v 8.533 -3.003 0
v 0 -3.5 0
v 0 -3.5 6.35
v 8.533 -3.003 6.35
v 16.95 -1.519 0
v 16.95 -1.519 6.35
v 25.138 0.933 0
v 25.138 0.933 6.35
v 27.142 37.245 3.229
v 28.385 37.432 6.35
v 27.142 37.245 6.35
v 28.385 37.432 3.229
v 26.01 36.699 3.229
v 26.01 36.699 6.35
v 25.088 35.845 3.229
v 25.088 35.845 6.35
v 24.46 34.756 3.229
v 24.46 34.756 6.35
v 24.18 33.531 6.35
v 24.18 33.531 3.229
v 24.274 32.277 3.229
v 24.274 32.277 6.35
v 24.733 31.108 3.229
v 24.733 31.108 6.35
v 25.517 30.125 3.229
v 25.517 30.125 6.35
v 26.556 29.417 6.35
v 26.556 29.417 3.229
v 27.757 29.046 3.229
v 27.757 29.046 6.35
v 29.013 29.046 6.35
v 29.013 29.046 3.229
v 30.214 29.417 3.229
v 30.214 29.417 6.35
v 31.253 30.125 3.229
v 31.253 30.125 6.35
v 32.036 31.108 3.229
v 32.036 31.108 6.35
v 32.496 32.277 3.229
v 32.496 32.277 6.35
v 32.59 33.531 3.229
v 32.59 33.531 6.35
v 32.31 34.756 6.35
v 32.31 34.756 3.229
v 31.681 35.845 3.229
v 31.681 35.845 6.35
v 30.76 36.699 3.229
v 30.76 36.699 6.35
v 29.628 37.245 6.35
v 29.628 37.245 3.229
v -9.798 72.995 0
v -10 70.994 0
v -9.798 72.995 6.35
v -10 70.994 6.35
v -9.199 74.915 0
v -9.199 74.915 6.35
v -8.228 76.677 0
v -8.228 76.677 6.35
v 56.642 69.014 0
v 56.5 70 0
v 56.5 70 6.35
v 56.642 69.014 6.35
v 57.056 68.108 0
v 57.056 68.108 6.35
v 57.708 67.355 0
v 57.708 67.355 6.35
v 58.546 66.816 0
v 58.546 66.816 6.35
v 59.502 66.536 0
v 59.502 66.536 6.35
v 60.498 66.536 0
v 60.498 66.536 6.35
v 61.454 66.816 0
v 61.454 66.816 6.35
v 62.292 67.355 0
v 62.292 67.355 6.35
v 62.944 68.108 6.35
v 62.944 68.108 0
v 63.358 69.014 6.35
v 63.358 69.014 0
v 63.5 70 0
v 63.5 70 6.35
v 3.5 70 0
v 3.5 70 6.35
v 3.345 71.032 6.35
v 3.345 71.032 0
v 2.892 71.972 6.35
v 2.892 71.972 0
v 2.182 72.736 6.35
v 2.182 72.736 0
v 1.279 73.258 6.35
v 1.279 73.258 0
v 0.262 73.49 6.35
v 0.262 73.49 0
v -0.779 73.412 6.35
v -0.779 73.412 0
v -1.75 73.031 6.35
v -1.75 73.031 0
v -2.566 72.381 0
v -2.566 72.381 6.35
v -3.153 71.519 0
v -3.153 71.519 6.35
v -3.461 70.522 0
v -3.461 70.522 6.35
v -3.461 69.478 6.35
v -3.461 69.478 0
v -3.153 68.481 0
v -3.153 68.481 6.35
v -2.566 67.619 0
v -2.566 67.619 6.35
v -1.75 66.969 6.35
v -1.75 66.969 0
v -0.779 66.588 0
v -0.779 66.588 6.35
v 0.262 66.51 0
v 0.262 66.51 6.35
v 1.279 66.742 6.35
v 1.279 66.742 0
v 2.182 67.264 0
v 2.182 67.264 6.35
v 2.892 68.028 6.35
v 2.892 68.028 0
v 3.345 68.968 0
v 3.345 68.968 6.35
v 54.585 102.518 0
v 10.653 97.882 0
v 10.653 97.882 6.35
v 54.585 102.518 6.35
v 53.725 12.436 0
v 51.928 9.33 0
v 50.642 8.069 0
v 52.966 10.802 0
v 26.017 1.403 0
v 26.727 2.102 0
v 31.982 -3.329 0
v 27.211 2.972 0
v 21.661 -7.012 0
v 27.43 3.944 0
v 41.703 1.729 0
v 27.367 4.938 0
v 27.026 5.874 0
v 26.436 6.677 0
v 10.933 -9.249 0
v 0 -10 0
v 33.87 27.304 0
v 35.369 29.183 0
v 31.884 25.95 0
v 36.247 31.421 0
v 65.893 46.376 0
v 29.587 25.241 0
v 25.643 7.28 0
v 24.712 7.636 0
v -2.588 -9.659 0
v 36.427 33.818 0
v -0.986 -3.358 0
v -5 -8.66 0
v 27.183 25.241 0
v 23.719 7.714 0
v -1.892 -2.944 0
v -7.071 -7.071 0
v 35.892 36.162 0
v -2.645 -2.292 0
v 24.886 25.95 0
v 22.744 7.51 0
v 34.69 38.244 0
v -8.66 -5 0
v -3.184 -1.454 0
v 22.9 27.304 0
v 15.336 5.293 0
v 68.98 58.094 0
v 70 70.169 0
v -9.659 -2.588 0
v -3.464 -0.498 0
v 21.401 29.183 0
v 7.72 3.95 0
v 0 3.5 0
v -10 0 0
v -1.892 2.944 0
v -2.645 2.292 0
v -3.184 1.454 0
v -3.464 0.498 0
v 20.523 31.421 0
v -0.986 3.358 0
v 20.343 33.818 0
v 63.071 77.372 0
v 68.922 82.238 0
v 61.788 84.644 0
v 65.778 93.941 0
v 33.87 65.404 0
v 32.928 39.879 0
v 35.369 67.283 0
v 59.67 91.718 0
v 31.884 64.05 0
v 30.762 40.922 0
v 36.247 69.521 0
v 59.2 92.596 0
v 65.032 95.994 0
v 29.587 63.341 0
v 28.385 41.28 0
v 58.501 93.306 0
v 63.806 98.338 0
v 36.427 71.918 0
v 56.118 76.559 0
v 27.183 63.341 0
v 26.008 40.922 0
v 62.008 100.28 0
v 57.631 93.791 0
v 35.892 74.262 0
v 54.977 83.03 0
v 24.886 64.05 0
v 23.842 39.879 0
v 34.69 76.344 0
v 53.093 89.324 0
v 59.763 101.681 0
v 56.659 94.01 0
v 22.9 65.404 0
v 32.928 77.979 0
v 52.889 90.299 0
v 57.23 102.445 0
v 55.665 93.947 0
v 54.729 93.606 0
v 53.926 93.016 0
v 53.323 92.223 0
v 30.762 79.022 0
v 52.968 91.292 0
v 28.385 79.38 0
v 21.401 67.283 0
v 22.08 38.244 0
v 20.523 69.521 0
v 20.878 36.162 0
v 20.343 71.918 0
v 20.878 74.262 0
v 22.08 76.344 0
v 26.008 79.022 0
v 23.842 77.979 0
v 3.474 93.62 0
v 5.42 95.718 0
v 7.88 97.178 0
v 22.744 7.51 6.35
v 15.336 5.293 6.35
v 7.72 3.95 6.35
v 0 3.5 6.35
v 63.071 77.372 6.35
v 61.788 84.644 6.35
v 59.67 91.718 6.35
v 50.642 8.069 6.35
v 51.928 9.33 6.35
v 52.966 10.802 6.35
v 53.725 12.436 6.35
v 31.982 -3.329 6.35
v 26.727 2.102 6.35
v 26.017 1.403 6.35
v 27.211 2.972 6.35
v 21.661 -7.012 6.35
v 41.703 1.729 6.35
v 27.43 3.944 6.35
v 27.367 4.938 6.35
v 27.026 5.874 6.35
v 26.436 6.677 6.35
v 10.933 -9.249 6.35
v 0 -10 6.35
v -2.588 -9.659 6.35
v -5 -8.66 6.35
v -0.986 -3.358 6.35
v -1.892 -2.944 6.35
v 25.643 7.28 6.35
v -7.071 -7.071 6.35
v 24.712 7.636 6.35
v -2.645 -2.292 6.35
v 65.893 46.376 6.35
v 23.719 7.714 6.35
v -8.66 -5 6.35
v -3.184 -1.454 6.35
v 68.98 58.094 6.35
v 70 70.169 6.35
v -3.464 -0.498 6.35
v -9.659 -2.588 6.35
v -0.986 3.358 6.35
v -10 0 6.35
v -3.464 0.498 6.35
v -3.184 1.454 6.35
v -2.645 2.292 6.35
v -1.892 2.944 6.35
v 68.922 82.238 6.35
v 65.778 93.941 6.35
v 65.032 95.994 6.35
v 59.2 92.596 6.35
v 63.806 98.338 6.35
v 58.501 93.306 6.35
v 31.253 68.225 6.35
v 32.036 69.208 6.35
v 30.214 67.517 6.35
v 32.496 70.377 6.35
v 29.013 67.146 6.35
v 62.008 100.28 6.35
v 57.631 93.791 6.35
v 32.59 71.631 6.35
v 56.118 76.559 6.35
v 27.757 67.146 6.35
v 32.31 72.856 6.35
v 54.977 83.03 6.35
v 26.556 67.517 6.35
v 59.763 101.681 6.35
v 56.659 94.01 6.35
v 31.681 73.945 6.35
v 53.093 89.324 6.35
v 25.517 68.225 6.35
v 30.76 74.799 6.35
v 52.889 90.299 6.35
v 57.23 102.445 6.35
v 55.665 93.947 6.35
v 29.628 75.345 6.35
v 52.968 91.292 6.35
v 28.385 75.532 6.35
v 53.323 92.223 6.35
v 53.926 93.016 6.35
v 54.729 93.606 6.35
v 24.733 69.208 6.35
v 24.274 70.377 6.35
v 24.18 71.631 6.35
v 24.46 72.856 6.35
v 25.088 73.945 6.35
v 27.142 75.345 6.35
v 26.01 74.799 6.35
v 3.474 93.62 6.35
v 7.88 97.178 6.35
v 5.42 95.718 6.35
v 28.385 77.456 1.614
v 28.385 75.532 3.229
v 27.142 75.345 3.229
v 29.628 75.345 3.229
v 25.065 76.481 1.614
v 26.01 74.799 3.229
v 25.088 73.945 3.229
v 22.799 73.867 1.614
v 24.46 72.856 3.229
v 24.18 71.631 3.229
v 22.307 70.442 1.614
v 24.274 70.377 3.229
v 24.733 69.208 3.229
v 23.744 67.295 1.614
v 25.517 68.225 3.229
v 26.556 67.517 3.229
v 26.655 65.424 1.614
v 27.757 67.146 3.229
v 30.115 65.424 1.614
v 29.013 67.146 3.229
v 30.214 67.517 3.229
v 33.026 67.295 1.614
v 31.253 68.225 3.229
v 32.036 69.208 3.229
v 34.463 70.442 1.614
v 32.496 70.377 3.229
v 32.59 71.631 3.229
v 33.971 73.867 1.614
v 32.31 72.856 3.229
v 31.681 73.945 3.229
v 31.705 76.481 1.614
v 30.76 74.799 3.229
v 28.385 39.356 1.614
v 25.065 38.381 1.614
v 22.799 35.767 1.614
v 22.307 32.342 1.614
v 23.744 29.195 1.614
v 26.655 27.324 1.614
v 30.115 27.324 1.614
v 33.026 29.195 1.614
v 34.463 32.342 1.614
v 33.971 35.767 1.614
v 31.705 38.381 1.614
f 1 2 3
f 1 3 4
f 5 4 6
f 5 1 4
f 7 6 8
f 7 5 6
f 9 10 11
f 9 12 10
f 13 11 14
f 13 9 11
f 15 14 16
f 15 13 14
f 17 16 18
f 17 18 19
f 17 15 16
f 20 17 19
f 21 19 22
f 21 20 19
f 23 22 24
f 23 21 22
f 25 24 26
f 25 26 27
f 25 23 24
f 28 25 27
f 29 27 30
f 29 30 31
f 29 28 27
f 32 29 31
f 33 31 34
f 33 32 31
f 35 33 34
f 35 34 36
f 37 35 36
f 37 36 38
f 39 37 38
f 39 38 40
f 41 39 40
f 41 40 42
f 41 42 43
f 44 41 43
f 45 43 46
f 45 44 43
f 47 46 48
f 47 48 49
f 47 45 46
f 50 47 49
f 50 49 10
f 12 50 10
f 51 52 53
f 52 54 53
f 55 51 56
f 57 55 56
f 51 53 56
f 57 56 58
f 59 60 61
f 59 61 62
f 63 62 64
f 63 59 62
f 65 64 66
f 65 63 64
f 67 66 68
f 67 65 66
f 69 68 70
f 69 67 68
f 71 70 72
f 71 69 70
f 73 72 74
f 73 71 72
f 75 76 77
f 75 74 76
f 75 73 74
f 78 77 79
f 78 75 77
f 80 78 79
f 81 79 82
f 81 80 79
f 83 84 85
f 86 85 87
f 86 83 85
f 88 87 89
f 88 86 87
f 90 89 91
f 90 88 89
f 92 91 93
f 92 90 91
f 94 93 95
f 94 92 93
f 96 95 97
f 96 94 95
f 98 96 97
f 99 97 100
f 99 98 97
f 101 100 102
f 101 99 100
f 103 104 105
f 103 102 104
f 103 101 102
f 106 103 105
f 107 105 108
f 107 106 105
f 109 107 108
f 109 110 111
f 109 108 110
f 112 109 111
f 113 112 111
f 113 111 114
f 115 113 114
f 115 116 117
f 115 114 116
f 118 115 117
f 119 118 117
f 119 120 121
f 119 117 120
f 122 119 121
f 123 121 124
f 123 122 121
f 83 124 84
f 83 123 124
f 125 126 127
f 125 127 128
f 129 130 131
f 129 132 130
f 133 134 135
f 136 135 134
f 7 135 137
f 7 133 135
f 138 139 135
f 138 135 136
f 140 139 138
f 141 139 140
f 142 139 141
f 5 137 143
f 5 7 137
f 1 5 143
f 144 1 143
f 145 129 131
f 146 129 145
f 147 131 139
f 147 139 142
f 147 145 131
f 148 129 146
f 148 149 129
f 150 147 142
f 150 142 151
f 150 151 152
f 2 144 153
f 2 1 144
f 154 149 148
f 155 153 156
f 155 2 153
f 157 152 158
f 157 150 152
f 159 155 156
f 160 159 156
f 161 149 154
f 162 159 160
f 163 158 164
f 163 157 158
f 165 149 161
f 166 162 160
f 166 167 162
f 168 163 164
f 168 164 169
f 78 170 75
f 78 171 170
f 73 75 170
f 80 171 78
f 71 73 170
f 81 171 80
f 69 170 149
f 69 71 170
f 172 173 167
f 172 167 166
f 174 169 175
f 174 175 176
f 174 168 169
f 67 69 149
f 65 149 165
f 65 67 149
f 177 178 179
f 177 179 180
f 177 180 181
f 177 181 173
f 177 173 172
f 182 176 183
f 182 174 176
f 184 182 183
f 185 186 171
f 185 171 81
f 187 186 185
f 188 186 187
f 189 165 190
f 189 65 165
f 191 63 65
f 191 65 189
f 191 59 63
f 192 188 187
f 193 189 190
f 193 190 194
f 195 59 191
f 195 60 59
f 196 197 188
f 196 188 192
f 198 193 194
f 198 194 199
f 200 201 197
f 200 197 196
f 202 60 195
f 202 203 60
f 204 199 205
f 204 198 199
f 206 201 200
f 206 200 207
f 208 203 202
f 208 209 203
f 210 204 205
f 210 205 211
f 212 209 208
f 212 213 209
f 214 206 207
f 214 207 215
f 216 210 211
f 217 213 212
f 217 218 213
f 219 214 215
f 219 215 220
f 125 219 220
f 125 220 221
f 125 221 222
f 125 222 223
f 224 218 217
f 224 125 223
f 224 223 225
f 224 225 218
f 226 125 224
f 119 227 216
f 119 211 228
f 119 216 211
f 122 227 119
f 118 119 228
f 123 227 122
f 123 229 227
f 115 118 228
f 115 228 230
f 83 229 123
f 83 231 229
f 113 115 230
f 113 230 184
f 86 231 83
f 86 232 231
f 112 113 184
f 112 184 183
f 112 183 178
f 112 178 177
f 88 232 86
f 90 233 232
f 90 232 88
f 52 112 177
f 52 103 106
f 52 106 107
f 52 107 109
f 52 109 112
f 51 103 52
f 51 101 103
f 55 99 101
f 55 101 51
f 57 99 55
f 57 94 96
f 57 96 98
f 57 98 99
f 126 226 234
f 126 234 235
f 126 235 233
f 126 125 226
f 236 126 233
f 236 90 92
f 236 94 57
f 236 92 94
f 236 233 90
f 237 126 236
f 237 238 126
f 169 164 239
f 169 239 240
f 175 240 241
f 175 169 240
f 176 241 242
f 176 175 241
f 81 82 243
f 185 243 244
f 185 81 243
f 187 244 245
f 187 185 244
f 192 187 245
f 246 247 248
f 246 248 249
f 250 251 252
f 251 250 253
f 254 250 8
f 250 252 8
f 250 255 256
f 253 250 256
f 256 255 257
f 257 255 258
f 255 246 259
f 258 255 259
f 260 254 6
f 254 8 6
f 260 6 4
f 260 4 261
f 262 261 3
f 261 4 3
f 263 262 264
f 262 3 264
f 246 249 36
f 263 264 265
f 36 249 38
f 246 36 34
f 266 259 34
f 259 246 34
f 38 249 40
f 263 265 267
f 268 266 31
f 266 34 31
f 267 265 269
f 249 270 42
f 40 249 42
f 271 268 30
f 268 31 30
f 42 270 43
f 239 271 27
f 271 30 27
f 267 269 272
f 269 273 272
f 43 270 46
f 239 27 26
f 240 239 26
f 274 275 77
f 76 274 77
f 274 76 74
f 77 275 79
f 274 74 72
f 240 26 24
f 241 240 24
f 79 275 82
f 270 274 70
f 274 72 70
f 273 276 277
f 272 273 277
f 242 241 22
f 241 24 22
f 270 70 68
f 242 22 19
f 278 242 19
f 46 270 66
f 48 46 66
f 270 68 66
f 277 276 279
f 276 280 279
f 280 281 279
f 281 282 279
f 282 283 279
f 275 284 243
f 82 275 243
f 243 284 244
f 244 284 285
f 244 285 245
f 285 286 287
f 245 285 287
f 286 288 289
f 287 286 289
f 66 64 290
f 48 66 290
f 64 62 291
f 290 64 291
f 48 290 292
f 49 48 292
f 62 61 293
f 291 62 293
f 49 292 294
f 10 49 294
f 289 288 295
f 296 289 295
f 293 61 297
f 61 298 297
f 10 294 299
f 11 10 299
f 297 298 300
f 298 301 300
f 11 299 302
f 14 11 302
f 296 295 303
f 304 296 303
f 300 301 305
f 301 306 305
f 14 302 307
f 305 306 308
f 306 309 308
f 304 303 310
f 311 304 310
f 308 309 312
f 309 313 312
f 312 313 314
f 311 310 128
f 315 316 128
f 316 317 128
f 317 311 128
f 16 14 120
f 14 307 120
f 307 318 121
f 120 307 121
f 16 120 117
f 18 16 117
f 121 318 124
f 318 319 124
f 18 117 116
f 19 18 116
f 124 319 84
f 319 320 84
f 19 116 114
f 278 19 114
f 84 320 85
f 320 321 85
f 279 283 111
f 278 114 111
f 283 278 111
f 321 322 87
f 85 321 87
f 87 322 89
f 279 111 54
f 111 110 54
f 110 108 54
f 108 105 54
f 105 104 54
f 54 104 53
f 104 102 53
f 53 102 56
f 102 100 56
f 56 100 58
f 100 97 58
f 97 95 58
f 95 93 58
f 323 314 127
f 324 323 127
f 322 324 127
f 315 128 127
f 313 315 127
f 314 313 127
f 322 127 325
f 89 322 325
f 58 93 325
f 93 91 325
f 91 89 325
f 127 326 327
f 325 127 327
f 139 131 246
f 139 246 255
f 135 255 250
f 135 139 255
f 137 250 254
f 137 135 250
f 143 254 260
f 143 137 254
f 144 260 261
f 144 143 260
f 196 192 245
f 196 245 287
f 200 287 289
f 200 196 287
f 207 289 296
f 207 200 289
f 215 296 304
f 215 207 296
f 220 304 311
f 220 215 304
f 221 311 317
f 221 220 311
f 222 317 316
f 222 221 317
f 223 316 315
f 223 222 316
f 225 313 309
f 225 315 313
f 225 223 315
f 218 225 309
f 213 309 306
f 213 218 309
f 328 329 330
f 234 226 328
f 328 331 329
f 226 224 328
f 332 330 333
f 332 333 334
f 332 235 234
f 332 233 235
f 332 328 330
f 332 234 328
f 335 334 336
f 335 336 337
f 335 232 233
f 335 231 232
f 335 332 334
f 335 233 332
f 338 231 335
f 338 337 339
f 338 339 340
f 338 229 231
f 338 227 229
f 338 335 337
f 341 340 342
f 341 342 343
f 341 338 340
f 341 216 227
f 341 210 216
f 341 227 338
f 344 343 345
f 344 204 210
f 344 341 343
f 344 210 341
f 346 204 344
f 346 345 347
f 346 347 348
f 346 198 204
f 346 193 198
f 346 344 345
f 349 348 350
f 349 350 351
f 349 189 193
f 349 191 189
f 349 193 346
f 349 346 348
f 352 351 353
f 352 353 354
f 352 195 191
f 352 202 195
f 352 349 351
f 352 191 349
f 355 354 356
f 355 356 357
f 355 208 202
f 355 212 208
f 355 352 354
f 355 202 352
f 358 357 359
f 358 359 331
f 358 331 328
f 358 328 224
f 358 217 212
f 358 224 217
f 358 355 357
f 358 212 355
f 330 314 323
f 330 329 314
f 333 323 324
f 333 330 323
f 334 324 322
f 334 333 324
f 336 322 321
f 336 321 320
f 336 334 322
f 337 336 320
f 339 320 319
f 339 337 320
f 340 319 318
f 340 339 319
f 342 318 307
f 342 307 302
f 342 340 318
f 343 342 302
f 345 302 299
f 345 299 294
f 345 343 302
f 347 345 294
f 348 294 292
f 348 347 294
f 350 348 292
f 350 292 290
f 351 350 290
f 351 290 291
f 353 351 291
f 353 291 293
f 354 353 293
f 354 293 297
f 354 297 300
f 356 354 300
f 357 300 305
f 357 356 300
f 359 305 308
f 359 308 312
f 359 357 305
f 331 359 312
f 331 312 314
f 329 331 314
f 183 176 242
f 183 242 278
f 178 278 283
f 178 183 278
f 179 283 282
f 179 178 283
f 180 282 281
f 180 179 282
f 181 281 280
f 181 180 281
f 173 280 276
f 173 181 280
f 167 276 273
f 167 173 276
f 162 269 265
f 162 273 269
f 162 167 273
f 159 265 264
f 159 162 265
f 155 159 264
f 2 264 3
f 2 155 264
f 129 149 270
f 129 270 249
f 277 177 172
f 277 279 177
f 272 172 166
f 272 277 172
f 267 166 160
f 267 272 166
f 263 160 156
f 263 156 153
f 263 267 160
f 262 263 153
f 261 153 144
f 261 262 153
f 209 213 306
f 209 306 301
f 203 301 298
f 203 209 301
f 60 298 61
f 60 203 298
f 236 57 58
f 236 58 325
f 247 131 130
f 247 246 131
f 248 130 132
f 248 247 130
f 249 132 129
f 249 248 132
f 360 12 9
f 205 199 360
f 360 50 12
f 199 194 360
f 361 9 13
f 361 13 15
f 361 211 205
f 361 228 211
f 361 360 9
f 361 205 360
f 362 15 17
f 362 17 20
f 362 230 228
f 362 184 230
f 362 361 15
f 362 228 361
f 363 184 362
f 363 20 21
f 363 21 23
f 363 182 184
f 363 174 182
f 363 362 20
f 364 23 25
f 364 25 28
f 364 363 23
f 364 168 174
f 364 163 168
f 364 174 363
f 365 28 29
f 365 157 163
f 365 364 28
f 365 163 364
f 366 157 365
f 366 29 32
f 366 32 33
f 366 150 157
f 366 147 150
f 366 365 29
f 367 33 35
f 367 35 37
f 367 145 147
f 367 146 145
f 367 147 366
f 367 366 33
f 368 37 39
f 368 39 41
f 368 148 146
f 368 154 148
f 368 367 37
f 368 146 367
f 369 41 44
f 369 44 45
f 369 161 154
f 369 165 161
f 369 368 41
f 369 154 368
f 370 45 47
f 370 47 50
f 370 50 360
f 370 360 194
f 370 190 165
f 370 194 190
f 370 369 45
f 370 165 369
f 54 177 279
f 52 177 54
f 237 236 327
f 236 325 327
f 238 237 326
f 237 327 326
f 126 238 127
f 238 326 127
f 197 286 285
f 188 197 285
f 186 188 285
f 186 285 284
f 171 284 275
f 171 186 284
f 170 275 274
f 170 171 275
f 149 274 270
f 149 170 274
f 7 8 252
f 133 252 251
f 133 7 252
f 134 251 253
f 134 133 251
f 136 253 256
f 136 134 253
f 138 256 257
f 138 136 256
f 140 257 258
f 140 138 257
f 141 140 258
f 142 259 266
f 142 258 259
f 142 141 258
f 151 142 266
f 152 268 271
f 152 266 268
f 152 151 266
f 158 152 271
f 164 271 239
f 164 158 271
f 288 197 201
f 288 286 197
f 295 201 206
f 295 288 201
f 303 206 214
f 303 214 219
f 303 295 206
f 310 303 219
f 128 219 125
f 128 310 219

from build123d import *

# Parameters (mm, degrees)
BOSS_EXTRUDE1_DEPTH                          = 6.35
SKETCH3_R                                    = 3.5
CUT_EXTRUDE2_DEPTH                           = 139.002460895
SKETCH4_OUTSIDE_W                            = 133.666
SKETCH4_OUTSIDE_H                            = 145.76
CUT_EXTRUDE3_DEPTH                           = 139.002460895
FILLET1_R                                    = 10
CSK_FOR_5_16_FLAT_HEAD_MACHINE_SCREW_2_COUNT = 2
CSK_FOR_5_16_FLAT_HEAD_MACHINE_SCREW_2_PITCH = 38.1


with BuildPart() as part:
    # Sketch2 → Boss-Extrude1 (new body)
    with BuildSketch(Plane.XY):
        with BuildLine():
            Line((-10, -10), (-10, 103.338336241))
            Line((-10, 103.338336241), (62.358282022, 103.338336241))
            Line((62.358282022, 103.338336241), (91.244424357, 23.974312441))
            ThreePointArc((91.244424357, 23.974312441), (79.259842401, 5.488091998), (63.591736031, -10))
            Line((63.591736031, -10), (-10, -10))
        make_face()
    extrude(amount=BOSS_EXTRUDE1_DEPTH)

    # Sketch3 → Cut-Extrude2 (cut, through all)
    with BuildSketch(Plane.XY):
        with Locations((0, 70)):
            Circle(SKETCH3_R)
        with BuildLine():
            ThreePointArc((53.092633074, 89.324138098), (55.641638045, 79.811122038), (56.5, 70))
            ThreePointArc((56.5, 70), (60, 66.5), (63.5, 70))
            ThreePointArc((63.5, 70), (62.535292316, 81.026659282), (59.67048142, 91.718279101))
            ThreePointArc((59.67048142, 91.718279101), (55.184486746, 93.810132772), (53.092633074, 89.324138098))
        make_face()
        with BuildLine():
            ThreePointArc((77.273680119, 26.460819381), (68.539219913, 13.703843633), (57.722230193, 2.657398108))
            ThreePointArc((57.722230193, 2.657398108), (57.342601892, -2.277769807), (62.277769807, -2.657398108))
            ThreePointArc((62.277769807, -2.657398108), (73.948455322, 9.260852265), (83.372254441, 23.024630908))
            ThreePointArc((83.372254441, 23.024630908), (82.041061517, 27.792012306), (77.273680119, 26.460819381))
        make_face()
        with BuildLine():
            ThreePointArc((22.744339531, 7.510440718), (11.547603815, 4.510284425), (0, 3.5))
            ThreePointArc((0, 3.5), (-3.5, 0), (0, -3.5))
            ThreePointArc((0, -3.5), (12.763141059, -2.383369846), (25.138480534, 0.932592372))
            ThreePointArc((25.138480534, 0.932592372), (27.230334206, 5.418587047), (22.744339531, 7.510440718))
        make_face()
    extrude(amount=CUT_EXTRUDE2_DEPTH, mode=Mode.SUBTRACT)

    # Sketch4 outside → Cut-Extrude3 (cut, through all)
    with BuildSketch(Plane.XY):
        with Locations((40.622, 46.669)):
            Rectangle(SKETCH4_OUTSIDE_W, SKETCH4_OUTSIDE_H)
        with BuildLine():
            Line((65.893010444, 46.375623296), (52.822036509, 9.918118713))
            ThreePointArc((52.822036509, 9.918118713), (28.226313052, -4.855028231), (0, -10))
            Line((0, -10), (-10, -10))
            Line((-10, -10), (-10, 74.111503744))
            Line((-10, 74.111503744), (6.084489401, 97.400118036))
            Line((6.084489401, 97.400118036), (62.358282022, 103.338336241))
            Line((62.358282022, 103.338336241), (65.778483455, 93.941410033))
            ThreePointArc((65.778483455, 93.941410033), (69.999797095, 70.168542697), (65.893010444, 46.375623296))
        make_face(mode=Mode.SUBTRACT)
    extrude(amount=CUT_EXTRUDE3_DEPTH, mode=Mode.SUBTRACT)

    # Fillet1
    fillet1_edges = [part.edges().sort_by_distance(p)[0] for p in [
        (52.822036509, 9.918118713, 3.175),
        (-10, -10, 3.175),
        (-10, 74.111503744, 3.175),
        (62.358282022, 103.338336241, 3.175),
        (6.084489401, 97.400118036, 3.175),
    ]]
    fillet(fillet1_edges, radius=FILLET1_R - 0.0001)  # a hair under: the kernel refuses the full size

    # Sketch9 → CSK for 5_16 Flat Head Machine Screw _10 (revolve, cut)
    with BuildSketch(Plane(origin=(28.384975395, 71.315714753, 0), x_dir=(0, 1, 0), z_dir=(1, 0, 0))):
        Polygon((0, 0), (0, 6.35), (4.2164, 6.35), (4.2164, 3.228939291), (8.0645, 0), align=None)
    csk_for_5_16_flat_head_machine_screw_10 = revolve(axis=Axis((28.384975395, 71.315714753, -6.35), (0, 0, 1)), mode=Mode.SUBTRACT)

    # CSK for 5_16 Flat Head Machine Screw 2: CSK for 5_16 Flat Head Machine Screw _10 ×2
    with Locations(*[(0, -i * CSK_FOR_5_16_FLAT_HEAD_MACHINE_SCREW_2_PITCH, 0) for i in range(1, CSK_FOR_5_16_FLAT_HEAD_MACHINE_SCREW_2_COUNT)]):
        add(csk_for_5_16_flat_head_machine_screw_10, mode=Mode.SUBTRACT)


solid = part.part
